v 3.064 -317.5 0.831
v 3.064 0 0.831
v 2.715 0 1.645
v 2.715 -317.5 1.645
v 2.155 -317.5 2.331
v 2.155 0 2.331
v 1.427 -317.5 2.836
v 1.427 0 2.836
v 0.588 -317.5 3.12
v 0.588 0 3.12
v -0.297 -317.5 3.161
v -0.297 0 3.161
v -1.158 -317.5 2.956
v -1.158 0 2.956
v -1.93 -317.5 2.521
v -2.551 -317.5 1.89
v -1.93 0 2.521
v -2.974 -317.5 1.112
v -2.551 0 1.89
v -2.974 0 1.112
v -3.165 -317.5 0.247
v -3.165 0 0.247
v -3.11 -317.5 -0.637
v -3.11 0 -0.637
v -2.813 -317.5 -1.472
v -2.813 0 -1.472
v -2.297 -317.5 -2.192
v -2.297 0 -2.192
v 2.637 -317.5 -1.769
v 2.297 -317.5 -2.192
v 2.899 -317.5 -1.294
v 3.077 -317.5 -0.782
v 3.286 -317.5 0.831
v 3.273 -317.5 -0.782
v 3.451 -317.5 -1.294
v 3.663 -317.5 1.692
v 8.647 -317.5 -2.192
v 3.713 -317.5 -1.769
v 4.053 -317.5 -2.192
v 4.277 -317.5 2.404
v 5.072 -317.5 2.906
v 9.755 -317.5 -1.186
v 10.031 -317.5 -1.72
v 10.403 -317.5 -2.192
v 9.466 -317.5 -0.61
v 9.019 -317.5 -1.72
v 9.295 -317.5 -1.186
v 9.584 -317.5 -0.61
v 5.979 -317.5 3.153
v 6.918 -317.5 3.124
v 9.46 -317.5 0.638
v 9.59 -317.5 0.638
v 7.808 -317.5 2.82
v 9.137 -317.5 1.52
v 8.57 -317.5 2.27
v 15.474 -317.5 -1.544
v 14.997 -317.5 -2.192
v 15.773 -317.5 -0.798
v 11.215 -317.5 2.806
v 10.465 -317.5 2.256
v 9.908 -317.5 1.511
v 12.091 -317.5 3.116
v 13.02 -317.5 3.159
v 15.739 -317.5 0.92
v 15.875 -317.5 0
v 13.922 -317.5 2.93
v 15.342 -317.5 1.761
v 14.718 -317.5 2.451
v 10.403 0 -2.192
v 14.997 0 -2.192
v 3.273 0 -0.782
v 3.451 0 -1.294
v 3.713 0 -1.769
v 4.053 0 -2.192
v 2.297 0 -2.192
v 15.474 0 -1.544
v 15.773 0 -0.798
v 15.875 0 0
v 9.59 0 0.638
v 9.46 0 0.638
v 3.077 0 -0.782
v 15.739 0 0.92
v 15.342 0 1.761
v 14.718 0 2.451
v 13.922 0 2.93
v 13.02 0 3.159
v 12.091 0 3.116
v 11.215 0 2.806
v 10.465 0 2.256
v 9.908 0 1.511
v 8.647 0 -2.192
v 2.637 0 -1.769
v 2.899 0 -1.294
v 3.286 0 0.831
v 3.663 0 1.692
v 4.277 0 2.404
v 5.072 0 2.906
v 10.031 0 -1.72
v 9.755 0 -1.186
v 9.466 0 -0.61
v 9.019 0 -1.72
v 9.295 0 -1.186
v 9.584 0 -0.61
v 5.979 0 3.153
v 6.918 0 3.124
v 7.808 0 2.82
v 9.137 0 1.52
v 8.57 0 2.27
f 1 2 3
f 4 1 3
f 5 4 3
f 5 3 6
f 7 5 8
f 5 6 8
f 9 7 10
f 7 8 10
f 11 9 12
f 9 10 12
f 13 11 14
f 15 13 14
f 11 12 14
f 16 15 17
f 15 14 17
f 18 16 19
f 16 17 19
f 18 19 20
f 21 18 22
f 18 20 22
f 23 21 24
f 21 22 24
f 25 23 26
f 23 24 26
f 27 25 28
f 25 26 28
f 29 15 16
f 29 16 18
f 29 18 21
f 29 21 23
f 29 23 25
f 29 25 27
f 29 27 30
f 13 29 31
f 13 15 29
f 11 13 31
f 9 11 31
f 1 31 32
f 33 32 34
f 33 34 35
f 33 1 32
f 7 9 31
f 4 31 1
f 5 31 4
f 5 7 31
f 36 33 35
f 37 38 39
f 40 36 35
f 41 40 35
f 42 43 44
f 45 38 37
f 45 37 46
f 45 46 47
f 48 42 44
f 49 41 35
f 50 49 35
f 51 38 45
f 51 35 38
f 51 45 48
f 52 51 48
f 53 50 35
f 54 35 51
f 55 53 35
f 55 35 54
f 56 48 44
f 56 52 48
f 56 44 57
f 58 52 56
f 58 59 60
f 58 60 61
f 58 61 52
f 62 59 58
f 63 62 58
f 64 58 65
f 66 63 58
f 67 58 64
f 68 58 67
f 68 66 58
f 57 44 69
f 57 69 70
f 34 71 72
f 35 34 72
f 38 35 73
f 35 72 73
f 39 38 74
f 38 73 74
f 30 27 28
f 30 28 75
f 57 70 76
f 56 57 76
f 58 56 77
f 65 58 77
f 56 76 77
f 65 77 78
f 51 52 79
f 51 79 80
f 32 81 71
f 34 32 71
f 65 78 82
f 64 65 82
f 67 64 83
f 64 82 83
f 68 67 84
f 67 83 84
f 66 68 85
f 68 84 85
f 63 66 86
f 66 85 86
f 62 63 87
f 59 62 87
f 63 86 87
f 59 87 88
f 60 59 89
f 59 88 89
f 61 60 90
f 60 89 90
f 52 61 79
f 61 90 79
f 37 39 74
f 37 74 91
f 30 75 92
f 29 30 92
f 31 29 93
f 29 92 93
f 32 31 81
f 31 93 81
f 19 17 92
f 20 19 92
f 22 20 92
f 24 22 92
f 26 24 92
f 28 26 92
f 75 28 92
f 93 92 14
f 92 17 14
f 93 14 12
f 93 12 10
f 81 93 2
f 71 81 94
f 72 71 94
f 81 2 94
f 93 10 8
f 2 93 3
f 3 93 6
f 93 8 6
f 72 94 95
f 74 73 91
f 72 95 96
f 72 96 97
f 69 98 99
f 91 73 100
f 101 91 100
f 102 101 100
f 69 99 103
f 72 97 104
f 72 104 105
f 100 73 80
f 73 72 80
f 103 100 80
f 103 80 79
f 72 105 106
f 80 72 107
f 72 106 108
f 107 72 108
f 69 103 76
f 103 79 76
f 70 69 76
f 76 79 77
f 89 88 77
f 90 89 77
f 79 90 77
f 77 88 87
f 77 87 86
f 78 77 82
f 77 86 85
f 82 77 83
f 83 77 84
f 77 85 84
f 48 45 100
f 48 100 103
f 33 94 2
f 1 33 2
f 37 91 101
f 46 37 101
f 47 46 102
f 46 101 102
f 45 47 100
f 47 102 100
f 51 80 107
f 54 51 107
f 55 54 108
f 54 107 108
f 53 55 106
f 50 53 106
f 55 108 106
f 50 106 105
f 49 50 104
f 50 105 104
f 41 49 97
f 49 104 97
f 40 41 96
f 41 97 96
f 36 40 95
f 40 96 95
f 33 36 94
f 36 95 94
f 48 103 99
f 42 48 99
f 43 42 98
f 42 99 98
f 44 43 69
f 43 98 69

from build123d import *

# Parameters (mm, degrees)
F1_DEPTH = 317.5


with BuildPart() as f1:
    # F0 (on Front) → F1 (new body)
    with BuildSketch(Plane.XZ):
        with BuildLine():
            ThreePointArc((3.0642884432, 0.8311205311), (-1.5592869758, 2.7657275945), (-2.2972373281, -2.1916490728))
            Line((-2.2972373281, -2.1916490728), (2.2972373281, -2.1916490728))
            ThreePointArc((2.2972373281, -2.1916490728), (2.7781759552, -1.5369981658), (3.0772573724, -0.7817365695))
            Line((3.0772573724, -0.7817365695), (2.3432357702, -0.7817365695))
            Line((2.3432357702, -0.7817365695), (2.3432357702, 0.8311205311))
            Line((2.3432357702, 0.8311205311), (3.0642884432, 0.8311205311))
        make_face()
        with BuildLine():
            ThreePointArc((3.2857115568, 0.8311205311), (3.2027995927, 0.4192309584), (3.175, 0))
            ThreePointArc((3.175, 0), (3.1995304193, -0.3939116923), (3.2727426276, -0.7817365695))
            Line((3.2727426276, -0.7817365695), (4.0206070989, -0.7817365695))
            Line((4.0206070989, -0.7817365695), (4.0206070989, 0.8311205311))
            Line((4.0206070989, 0.8311205311), (3.2857115568, 0.8311205311))
        make_face()
        with BuildLine():
            ThreePointArc((3.175, 0), (3.1472004073, 0.4192309584), (3.0642884432, 0.8311205311))
            Line((3.0642884432, 0.8311205311), (2.3432357702, 0.8311205311))
            Line((2.3432357702, 0.8311205311), (2.3432357702, -0.7817365695))
            Line((2.3432357702, -0.7817365695), (3.0772573724, -0.7817365695))
            ThreePointArc((3.0772573724, -0.7817365695), (3.1504695807, -0.3939116923), (3.175, 0))
        make_face()
        with BuildLine():
            Line((3.2857115568, 0.8311205311), (3.0642884432, 0.8311205311))
            ThreePointArc((3.0642884432, 0.8311205311), (3.1472004073, 0.4192309584), (3.175, 0))
            ThreePointArc((3.175, 0), (3.2027995927, 0.4192309584), (3.2857115568, 0.8311205311))
        make_face()
        with BuildLine():
            ThreePointArc((3.175, 0), (3.1504695807, -0.3939116923), (3.0772573724, -0.7817365695))
            Line((3.0772573724, -0.7817365695), (3.2727426276, -0.7817365695))
            ThreePointArc((3.2727426276, -0.7817365695), (3.1995304193, -0.3939116923), (3.175, 0))
        make_face()
        with BuildLine():
            ThreePointArc((3.2727426276, -0.7817365695), (3.5718240448, -1.5369981658), (4.0527626719, -2.1916490728))
            Line((4.0527626719, -2.1916490728), (8.6472373281, -2.1916490728))
            ThreePointArc((8.6472373281, -2.1916490728), (9.1697839759, -1.4592612272), (9.4659095878, -0.6096986472))
            Line((9.4659095878, -0.6096986472), (9.0097114444, -0.6096986472))
            Line((9.0097114444, -0.6096986472), (9.0097114444, 0.6375776138))
            Line((9.0097114444, 0.6375776138), (9.4603247075, 0.6375776138))
            ThreePointArc((9.4603247075, 0.6375776138), (6.4494713507, 3.1734414207), (3.2857115568, 0.8311205311))
            Line((3.2857115568, 0.8311205311), (4.0206070989, 0.8311205311))
            Line((4.0206070989, 0.8311205311), (4.0206070989, -0.7817365695))
            Line((4.0206070989, -0.7817365695), (3.2727426276, -0.7817365695))
        make_face()
        with BuildLine():
            ThreePointArc((9.525, 0), (9.5087897957, 0.3204247599), (9.4603247075, 0.6375776138))
            Line((9.4603247075, 0.6375776138), (9.0097114444, 0.6375776138))
            Line((9.0097114444, 0.6375776138), (9.0097114444, -0.6096986472))
            Line((9.0097114444, -0.6096986472), (9.4659095878, -0.6096986472))
            ThreePointArc((9.4659095878, -0.6096986472), (9.5101928692, -0.3062776996), (9.525, 0))
        make_face()
        with BuildLine():
            ThreePointArc((9.5840904122, -0.6096986472), (9.8802160241, -1.4592612272), (10.4027626719, -2.1916490728))
            Line((10.4027626719, -2.1916490728), (14.9972373281, -2.1916490728))
            ThreePointArc((14.9972373281, -2.1916490728), (15.6474016961, -1.1804440866), (15.875, 0))
            ThreePointArc((15.875, 0), (13.0204247599, 3.1587897957), (9.5896752925, 0.6375776138))
            Line((9.5896752925, 0.6375776138), (10.278493166, 0.6375776138))
            Line((10.278493166, 0.6375776138), (10.278493166, -0.6096986472))
            Line((10.278493166, -0.6096986472), (9.5840904122, -0.6096986472))
        make_face()
        with BuildLine():
            ThreePointArc((9.5896752925, 0.6375776138), (9.5412102043, 0.3204247599), (9.525, 0))
            ThreePointArc((9.525, 0), (9.5398071308, -0.3062776996), (9.5840904122, -0.6096986472))
            Line((9.5840904122, -0.6096986472), (10.278493166, -0.6096986472))
            Line((10.278493166, -0.6096986472), (10.278493166, 0.6375776138))
            Line((10.278493166, 0.6375776138), (9.5896752925, 0.6375776138))
        make_face()
        with BuildLine():
            Line((9.5896752925, 0.6375776138), (9.4603247075, 0.6375776138))
            ThreePointArc((9.4603247075, 0.6375776138), (9.5087897957, 0.3204247599), (9.525, 0))
            ThreePointArc((9.525, 0), (9.5412102043, 0.3204247599), (9.5896752925, 0.6375776138))
        make_face()
        with BuildLine():
            ThreePointArc((9.525, 0), (9.5101928692, -0.3062776996), (9.4659095878, -0.6096986472))
            Line((9.4659095878, -0.6096986472), (9.5840904122, -0.6096986472))
            ThreePointArc((9.5840904122, -0.6096986472), (9.5398071308, -0.3062776996), (9.525, 0))
        make_face()
    extrude(amount=F1_DEPTH)


solid = f1.part
